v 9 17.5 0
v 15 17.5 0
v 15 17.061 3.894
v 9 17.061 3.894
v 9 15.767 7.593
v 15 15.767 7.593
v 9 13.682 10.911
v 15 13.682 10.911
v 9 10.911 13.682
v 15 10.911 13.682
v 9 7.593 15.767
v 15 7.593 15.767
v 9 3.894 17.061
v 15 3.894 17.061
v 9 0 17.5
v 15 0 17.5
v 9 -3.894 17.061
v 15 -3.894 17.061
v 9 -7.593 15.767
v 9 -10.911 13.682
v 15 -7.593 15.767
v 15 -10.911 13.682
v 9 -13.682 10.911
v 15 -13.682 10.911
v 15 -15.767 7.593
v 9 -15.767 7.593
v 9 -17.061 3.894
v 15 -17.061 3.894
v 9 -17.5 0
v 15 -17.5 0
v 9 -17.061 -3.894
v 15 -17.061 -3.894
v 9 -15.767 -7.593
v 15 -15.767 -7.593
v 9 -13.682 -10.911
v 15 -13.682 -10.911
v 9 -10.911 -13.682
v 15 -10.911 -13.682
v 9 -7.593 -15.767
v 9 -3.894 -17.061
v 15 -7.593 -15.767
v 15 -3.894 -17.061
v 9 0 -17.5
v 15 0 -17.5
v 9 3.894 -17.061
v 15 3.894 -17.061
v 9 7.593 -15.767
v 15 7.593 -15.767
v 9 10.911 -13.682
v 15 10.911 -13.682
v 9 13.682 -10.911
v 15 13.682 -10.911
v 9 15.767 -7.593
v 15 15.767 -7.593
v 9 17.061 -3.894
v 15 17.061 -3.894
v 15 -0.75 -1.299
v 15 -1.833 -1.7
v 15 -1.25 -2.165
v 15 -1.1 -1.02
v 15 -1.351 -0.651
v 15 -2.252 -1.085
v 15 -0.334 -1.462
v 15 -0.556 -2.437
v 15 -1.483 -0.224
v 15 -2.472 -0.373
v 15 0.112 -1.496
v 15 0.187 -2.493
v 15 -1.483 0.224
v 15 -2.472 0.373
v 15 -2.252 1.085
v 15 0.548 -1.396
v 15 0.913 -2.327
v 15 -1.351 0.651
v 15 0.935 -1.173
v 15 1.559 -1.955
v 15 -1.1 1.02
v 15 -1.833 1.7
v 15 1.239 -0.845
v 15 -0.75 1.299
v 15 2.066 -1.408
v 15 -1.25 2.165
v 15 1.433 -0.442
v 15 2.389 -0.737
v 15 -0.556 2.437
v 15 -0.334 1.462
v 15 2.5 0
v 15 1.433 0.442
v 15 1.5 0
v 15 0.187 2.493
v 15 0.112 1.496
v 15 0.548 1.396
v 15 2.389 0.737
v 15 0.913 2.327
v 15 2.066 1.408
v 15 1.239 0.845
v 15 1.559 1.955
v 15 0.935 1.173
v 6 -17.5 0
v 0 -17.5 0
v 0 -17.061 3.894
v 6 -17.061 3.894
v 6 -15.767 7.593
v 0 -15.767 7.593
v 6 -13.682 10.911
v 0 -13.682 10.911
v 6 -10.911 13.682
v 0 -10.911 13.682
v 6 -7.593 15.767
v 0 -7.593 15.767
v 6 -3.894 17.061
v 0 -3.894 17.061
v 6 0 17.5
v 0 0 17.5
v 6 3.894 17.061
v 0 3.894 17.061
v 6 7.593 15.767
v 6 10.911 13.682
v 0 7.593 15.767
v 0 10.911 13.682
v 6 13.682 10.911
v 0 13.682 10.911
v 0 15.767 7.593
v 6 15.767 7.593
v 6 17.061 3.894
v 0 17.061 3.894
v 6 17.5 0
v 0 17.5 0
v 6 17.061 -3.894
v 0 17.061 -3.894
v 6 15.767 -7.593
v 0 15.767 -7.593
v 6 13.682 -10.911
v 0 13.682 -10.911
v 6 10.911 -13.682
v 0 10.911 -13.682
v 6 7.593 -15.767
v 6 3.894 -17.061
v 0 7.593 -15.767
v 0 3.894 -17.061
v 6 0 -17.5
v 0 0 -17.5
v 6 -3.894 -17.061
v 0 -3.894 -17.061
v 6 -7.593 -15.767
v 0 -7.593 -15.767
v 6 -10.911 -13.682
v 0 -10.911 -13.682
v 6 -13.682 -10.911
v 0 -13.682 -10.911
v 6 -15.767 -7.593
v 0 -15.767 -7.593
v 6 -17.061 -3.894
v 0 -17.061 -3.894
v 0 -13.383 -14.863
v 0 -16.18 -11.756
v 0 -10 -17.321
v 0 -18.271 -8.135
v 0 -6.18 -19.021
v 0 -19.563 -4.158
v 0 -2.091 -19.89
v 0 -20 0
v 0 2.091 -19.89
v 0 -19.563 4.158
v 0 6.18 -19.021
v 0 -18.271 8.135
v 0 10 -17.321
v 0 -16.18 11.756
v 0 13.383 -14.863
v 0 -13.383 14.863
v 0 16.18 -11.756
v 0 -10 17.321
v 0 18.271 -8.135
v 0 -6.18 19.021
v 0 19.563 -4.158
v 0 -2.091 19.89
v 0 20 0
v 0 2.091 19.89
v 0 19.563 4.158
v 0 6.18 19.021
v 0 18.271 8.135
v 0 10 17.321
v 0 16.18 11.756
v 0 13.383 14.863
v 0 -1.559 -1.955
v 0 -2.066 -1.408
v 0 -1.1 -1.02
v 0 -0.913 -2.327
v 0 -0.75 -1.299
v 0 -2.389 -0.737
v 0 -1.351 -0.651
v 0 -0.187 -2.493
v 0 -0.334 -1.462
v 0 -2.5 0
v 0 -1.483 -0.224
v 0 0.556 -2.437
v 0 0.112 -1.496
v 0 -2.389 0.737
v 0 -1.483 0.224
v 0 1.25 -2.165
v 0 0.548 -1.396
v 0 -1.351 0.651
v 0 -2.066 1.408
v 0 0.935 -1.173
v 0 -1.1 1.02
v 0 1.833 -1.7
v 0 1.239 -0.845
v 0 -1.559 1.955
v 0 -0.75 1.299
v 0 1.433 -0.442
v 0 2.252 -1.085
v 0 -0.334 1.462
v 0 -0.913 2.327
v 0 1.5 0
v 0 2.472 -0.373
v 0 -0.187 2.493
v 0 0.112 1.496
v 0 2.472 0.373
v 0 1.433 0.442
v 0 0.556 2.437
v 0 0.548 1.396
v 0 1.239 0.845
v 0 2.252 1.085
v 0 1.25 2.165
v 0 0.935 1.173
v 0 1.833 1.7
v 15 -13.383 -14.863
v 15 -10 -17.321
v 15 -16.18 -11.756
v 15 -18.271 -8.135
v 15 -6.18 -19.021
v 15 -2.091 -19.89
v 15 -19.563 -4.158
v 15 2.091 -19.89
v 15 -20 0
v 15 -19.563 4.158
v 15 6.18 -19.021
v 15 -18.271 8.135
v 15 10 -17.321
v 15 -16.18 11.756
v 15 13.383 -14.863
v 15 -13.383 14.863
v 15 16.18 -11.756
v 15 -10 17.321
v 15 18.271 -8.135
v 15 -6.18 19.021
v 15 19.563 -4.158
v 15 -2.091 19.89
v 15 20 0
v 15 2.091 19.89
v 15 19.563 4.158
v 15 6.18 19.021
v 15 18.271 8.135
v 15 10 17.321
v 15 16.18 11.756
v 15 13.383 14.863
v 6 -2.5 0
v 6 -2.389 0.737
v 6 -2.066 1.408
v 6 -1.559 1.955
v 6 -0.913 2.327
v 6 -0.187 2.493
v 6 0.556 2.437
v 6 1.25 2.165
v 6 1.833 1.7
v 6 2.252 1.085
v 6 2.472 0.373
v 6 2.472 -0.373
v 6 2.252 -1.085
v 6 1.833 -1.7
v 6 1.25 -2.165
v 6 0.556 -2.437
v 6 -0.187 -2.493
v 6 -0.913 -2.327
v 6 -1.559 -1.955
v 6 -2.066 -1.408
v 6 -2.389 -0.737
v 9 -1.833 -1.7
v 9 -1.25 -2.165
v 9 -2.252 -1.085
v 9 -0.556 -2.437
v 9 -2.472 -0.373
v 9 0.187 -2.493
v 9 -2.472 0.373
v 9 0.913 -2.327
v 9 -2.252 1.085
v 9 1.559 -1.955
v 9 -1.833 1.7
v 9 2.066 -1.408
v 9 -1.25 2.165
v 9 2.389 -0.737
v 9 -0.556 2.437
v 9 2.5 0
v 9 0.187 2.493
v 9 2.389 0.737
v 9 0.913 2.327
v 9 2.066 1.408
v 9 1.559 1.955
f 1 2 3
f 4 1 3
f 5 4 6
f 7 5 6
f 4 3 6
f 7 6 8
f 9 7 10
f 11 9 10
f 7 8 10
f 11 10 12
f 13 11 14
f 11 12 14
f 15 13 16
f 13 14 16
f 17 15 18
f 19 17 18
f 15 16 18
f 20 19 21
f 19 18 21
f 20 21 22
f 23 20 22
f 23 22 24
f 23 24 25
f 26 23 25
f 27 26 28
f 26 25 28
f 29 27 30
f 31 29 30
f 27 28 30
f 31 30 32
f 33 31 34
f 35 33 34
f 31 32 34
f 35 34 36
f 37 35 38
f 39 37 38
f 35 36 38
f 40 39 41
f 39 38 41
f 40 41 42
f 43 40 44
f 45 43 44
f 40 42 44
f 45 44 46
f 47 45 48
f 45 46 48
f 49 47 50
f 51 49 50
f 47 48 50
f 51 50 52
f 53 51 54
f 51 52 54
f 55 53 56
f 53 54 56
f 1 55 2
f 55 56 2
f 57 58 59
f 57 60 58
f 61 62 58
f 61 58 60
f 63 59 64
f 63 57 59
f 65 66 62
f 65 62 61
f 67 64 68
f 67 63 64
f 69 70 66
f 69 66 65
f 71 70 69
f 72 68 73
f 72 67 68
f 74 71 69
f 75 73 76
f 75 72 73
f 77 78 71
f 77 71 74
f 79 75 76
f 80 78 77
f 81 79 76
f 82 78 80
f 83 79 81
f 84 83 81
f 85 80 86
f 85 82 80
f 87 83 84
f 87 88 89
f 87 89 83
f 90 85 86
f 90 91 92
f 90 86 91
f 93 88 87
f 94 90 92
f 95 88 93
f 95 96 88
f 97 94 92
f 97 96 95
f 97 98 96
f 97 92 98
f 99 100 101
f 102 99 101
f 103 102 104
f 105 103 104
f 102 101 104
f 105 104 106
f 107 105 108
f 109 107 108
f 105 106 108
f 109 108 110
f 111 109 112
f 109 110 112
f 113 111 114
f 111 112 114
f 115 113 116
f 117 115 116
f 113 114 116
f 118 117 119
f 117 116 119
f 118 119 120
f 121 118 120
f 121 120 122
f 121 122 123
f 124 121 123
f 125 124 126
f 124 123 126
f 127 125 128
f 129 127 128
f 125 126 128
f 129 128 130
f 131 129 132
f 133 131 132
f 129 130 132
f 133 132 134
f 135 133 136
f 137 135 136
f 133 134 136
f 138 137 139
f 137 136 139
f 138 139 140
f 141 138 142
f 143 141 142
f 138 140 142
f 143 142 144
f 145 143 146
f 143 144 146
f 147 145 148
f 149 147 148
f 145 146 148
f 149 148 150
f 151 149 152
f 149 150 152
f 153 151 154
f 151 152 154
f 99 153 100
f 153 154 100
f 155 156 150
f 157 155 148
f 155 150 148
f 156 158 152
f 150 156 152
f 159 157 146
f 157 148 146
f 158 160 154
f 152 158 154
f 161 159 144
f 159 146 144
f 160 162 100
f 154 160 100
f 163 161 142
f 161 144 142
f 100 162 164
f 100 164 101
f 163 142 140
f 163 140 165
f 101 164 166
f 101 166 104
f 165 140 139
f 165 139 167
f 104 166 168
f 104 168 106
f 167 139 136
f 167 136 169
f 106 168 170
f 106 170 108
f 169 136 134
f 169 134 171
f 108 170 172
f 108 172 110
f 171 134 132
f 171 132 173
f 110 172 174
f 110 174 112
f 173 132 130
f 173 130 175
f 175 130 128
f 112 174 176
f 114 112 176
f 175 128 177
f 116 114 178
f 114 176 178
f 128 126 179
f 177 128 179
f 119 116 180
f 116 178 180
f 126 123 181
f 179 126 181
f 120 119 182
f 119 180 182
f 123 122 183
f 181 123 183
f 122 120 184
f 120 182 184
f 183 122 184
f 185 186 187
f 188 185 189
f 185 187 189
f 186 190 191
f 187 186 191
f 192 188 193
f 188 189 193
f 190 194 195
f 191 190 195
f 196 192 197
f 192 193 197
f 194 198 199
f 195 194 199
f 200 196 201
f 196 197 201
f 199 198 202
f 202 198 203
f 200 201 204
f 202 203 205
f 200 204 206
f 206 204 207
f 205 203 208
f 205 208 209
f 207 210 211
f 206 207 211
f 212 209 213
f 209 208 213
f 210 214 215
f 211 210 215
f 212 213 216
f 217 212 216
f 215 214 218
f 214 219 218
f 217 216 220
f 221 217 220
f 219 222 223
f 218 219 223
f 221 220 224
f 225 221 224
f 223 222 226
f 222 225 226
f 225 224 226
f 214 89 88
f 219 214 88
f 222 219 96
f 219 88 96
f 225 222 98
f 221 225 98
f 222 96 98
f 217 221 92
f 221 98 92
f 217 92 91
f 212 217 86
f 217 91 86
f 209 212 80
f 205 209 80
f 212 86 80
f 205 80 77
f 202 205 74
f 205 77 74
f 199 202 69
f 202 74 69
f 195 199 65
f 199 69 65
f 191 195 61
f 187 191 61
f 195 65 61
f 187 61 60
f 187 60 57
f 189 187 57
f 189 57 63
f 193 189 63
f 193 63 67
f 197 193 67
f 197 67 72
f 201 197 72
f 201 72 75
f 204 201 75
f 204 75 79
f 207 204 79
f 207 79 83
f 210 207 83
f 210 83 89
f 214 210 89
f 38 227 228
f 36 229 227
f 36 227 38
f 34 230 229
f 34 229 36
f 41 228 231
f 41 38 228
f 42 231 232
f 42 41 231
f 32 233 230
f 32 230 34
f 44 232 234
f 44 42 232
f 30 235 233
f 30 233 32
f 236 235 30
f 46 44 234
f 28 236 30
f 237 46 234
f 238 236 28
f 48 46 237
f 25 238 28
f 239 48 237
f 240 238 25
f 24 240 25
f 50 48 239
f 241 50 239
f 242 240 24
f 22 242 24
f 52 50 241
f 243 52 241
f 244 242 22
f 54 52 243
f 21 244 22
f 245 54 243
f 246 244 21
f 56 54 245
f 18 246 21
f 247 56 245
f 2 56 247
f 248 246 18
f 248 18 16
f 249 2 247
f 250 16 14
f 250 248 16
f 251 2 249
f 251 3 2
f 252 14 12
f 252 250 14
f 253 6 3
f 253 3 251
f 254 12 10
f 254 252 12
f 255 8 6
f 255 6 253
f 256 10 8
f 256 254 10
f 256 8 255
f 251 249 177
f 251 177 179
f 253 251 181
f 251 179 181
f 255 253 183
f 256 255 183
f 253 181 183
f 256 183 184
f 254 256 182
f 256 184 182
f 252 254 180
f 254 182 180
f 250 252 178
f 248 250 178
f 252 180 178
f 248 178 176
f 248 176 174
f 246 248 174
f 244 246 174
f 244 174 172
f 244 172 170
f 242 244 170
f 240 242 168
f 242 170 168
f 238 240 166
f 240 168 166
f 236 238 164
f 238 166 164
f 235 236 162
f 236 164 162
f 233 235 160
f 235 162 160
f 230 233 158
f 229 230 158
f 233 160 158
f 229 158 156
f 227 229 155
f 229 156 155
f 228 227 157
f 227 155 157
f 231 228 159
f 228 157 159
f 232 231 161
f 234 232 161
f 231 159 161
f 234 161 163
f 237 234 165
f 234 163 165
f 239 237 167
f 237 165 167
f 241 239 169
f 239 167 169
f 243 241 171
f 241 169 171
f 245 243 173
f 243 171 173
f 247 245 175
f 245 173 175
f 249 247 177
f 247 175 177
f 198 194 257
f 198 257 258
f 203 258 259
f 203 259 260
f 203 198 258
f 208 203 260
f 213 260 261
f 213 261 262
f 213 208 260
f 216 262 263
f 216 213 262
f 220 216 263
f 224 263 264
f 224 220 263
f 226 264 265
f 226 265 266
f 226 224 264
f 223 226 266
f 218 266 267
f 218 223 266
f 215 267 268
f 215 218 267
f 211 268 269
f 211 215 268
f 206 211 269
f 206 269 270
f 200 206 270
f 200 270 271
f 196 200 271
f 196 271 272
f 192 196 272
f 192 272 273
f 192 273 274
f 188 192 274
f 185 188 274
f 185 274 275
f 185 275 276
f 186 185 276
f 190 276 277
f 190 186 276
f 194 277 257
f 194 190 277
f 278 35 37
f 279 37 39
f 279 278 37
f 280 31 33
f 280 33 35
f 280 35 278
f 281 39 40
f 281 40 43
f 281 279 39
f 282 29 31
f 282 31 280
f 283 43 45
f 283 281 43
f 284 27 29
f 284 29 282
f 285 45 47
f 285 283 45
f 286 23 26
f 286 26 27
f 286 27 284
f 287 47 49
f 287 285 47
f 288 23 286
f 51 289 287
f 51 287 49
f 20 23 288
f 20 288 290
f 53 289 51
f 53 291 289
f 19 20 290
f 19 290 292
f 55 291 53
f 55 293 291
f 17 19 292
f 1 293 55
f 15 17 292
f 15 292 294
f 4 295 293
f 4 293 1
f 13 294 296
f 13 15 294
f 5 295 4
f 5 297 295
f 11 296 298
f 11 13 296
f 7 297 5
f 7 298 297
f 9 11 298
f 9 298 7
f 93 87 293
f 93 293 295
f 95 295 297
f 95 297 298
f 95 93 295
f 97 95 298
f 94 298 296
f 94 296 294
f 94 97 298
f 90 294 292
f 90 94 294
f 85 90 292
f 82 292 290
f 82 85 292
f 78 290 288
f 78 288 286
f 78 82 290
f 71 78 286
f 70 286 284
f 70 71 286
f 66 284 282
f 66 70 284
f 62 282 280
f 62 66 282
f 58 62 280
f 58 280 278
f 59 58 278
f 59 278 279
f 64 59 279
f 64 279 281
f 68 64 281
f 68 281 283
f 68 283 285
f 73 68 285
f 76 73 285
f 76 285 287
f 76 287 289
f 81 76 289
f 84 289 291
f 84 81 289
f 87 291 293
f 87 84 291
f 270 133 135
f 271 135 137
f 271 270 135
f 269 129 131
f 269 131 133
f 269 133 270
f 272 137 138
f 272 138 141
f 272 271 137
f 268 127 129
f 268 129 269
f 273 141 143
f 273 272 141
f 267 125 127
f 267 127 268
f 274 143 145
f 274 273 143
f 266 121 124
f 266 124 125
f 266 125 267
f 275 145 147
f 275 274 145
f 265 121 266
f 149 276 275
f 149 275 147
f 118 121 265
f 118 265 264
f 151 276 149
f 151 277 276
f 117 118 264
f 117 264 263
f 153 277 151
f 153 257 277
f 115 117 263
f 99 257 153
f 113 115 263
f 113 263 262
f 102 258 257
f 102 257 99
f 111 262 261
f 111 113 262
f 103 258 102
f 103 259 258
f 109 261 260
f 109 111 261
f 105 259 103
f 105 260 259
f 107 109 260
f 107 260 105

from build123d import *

# Parameters (mm, degrees)
F0_R     = 20
F1_DEPTH = 15
F2_R     = 17.5
F2_R_2   = 2.5
F3_DEPTH = 6
F4_R     = 1.5
F5_DEPTH = 25
F6_R     = 17.5
F6_R_2   = 2.5
F7_DEPTH = 6


with BuildPart() as f1:
    # F0 (on Right) → F1 (new body)
    with BuildSketch(Plane.YZ):
        Circle(F0_R)
    extrude(amount=F1_DEPTH)

    # F2 (on face) → F3 (cut)
    with BuildSketch(Plane.YZ.offset(15)):
        Circle(F2_R)
        Circle(F2_R_2, mode=Mode.SUBTRACT)
    extrude(amount=-F3_DEPTH, mode=Mode.SUBTRACT)

    # F4 (on face) → F5 (cut)
    with BuildSketch(Plane.YZ.offset(15)):
        Circle(F4_R)
    extrude(amount=-F5_DEPTH, mode=Mode.SUBTRACT)

    # F6 (on face) → F7 (cut)
    with BuildSketch(Plane(origin=(0, 0, 0), x_dir=(0, -1, 0), z_dir=(-1, 0, 0))):
        Circle(F6_R)
        Circle(F6_R_2, mode=Mode.SUBTRACT)
    extrude(amount=-F7_DEPTH, mode=Mode.SUBTRACT)


solid = f1.part
